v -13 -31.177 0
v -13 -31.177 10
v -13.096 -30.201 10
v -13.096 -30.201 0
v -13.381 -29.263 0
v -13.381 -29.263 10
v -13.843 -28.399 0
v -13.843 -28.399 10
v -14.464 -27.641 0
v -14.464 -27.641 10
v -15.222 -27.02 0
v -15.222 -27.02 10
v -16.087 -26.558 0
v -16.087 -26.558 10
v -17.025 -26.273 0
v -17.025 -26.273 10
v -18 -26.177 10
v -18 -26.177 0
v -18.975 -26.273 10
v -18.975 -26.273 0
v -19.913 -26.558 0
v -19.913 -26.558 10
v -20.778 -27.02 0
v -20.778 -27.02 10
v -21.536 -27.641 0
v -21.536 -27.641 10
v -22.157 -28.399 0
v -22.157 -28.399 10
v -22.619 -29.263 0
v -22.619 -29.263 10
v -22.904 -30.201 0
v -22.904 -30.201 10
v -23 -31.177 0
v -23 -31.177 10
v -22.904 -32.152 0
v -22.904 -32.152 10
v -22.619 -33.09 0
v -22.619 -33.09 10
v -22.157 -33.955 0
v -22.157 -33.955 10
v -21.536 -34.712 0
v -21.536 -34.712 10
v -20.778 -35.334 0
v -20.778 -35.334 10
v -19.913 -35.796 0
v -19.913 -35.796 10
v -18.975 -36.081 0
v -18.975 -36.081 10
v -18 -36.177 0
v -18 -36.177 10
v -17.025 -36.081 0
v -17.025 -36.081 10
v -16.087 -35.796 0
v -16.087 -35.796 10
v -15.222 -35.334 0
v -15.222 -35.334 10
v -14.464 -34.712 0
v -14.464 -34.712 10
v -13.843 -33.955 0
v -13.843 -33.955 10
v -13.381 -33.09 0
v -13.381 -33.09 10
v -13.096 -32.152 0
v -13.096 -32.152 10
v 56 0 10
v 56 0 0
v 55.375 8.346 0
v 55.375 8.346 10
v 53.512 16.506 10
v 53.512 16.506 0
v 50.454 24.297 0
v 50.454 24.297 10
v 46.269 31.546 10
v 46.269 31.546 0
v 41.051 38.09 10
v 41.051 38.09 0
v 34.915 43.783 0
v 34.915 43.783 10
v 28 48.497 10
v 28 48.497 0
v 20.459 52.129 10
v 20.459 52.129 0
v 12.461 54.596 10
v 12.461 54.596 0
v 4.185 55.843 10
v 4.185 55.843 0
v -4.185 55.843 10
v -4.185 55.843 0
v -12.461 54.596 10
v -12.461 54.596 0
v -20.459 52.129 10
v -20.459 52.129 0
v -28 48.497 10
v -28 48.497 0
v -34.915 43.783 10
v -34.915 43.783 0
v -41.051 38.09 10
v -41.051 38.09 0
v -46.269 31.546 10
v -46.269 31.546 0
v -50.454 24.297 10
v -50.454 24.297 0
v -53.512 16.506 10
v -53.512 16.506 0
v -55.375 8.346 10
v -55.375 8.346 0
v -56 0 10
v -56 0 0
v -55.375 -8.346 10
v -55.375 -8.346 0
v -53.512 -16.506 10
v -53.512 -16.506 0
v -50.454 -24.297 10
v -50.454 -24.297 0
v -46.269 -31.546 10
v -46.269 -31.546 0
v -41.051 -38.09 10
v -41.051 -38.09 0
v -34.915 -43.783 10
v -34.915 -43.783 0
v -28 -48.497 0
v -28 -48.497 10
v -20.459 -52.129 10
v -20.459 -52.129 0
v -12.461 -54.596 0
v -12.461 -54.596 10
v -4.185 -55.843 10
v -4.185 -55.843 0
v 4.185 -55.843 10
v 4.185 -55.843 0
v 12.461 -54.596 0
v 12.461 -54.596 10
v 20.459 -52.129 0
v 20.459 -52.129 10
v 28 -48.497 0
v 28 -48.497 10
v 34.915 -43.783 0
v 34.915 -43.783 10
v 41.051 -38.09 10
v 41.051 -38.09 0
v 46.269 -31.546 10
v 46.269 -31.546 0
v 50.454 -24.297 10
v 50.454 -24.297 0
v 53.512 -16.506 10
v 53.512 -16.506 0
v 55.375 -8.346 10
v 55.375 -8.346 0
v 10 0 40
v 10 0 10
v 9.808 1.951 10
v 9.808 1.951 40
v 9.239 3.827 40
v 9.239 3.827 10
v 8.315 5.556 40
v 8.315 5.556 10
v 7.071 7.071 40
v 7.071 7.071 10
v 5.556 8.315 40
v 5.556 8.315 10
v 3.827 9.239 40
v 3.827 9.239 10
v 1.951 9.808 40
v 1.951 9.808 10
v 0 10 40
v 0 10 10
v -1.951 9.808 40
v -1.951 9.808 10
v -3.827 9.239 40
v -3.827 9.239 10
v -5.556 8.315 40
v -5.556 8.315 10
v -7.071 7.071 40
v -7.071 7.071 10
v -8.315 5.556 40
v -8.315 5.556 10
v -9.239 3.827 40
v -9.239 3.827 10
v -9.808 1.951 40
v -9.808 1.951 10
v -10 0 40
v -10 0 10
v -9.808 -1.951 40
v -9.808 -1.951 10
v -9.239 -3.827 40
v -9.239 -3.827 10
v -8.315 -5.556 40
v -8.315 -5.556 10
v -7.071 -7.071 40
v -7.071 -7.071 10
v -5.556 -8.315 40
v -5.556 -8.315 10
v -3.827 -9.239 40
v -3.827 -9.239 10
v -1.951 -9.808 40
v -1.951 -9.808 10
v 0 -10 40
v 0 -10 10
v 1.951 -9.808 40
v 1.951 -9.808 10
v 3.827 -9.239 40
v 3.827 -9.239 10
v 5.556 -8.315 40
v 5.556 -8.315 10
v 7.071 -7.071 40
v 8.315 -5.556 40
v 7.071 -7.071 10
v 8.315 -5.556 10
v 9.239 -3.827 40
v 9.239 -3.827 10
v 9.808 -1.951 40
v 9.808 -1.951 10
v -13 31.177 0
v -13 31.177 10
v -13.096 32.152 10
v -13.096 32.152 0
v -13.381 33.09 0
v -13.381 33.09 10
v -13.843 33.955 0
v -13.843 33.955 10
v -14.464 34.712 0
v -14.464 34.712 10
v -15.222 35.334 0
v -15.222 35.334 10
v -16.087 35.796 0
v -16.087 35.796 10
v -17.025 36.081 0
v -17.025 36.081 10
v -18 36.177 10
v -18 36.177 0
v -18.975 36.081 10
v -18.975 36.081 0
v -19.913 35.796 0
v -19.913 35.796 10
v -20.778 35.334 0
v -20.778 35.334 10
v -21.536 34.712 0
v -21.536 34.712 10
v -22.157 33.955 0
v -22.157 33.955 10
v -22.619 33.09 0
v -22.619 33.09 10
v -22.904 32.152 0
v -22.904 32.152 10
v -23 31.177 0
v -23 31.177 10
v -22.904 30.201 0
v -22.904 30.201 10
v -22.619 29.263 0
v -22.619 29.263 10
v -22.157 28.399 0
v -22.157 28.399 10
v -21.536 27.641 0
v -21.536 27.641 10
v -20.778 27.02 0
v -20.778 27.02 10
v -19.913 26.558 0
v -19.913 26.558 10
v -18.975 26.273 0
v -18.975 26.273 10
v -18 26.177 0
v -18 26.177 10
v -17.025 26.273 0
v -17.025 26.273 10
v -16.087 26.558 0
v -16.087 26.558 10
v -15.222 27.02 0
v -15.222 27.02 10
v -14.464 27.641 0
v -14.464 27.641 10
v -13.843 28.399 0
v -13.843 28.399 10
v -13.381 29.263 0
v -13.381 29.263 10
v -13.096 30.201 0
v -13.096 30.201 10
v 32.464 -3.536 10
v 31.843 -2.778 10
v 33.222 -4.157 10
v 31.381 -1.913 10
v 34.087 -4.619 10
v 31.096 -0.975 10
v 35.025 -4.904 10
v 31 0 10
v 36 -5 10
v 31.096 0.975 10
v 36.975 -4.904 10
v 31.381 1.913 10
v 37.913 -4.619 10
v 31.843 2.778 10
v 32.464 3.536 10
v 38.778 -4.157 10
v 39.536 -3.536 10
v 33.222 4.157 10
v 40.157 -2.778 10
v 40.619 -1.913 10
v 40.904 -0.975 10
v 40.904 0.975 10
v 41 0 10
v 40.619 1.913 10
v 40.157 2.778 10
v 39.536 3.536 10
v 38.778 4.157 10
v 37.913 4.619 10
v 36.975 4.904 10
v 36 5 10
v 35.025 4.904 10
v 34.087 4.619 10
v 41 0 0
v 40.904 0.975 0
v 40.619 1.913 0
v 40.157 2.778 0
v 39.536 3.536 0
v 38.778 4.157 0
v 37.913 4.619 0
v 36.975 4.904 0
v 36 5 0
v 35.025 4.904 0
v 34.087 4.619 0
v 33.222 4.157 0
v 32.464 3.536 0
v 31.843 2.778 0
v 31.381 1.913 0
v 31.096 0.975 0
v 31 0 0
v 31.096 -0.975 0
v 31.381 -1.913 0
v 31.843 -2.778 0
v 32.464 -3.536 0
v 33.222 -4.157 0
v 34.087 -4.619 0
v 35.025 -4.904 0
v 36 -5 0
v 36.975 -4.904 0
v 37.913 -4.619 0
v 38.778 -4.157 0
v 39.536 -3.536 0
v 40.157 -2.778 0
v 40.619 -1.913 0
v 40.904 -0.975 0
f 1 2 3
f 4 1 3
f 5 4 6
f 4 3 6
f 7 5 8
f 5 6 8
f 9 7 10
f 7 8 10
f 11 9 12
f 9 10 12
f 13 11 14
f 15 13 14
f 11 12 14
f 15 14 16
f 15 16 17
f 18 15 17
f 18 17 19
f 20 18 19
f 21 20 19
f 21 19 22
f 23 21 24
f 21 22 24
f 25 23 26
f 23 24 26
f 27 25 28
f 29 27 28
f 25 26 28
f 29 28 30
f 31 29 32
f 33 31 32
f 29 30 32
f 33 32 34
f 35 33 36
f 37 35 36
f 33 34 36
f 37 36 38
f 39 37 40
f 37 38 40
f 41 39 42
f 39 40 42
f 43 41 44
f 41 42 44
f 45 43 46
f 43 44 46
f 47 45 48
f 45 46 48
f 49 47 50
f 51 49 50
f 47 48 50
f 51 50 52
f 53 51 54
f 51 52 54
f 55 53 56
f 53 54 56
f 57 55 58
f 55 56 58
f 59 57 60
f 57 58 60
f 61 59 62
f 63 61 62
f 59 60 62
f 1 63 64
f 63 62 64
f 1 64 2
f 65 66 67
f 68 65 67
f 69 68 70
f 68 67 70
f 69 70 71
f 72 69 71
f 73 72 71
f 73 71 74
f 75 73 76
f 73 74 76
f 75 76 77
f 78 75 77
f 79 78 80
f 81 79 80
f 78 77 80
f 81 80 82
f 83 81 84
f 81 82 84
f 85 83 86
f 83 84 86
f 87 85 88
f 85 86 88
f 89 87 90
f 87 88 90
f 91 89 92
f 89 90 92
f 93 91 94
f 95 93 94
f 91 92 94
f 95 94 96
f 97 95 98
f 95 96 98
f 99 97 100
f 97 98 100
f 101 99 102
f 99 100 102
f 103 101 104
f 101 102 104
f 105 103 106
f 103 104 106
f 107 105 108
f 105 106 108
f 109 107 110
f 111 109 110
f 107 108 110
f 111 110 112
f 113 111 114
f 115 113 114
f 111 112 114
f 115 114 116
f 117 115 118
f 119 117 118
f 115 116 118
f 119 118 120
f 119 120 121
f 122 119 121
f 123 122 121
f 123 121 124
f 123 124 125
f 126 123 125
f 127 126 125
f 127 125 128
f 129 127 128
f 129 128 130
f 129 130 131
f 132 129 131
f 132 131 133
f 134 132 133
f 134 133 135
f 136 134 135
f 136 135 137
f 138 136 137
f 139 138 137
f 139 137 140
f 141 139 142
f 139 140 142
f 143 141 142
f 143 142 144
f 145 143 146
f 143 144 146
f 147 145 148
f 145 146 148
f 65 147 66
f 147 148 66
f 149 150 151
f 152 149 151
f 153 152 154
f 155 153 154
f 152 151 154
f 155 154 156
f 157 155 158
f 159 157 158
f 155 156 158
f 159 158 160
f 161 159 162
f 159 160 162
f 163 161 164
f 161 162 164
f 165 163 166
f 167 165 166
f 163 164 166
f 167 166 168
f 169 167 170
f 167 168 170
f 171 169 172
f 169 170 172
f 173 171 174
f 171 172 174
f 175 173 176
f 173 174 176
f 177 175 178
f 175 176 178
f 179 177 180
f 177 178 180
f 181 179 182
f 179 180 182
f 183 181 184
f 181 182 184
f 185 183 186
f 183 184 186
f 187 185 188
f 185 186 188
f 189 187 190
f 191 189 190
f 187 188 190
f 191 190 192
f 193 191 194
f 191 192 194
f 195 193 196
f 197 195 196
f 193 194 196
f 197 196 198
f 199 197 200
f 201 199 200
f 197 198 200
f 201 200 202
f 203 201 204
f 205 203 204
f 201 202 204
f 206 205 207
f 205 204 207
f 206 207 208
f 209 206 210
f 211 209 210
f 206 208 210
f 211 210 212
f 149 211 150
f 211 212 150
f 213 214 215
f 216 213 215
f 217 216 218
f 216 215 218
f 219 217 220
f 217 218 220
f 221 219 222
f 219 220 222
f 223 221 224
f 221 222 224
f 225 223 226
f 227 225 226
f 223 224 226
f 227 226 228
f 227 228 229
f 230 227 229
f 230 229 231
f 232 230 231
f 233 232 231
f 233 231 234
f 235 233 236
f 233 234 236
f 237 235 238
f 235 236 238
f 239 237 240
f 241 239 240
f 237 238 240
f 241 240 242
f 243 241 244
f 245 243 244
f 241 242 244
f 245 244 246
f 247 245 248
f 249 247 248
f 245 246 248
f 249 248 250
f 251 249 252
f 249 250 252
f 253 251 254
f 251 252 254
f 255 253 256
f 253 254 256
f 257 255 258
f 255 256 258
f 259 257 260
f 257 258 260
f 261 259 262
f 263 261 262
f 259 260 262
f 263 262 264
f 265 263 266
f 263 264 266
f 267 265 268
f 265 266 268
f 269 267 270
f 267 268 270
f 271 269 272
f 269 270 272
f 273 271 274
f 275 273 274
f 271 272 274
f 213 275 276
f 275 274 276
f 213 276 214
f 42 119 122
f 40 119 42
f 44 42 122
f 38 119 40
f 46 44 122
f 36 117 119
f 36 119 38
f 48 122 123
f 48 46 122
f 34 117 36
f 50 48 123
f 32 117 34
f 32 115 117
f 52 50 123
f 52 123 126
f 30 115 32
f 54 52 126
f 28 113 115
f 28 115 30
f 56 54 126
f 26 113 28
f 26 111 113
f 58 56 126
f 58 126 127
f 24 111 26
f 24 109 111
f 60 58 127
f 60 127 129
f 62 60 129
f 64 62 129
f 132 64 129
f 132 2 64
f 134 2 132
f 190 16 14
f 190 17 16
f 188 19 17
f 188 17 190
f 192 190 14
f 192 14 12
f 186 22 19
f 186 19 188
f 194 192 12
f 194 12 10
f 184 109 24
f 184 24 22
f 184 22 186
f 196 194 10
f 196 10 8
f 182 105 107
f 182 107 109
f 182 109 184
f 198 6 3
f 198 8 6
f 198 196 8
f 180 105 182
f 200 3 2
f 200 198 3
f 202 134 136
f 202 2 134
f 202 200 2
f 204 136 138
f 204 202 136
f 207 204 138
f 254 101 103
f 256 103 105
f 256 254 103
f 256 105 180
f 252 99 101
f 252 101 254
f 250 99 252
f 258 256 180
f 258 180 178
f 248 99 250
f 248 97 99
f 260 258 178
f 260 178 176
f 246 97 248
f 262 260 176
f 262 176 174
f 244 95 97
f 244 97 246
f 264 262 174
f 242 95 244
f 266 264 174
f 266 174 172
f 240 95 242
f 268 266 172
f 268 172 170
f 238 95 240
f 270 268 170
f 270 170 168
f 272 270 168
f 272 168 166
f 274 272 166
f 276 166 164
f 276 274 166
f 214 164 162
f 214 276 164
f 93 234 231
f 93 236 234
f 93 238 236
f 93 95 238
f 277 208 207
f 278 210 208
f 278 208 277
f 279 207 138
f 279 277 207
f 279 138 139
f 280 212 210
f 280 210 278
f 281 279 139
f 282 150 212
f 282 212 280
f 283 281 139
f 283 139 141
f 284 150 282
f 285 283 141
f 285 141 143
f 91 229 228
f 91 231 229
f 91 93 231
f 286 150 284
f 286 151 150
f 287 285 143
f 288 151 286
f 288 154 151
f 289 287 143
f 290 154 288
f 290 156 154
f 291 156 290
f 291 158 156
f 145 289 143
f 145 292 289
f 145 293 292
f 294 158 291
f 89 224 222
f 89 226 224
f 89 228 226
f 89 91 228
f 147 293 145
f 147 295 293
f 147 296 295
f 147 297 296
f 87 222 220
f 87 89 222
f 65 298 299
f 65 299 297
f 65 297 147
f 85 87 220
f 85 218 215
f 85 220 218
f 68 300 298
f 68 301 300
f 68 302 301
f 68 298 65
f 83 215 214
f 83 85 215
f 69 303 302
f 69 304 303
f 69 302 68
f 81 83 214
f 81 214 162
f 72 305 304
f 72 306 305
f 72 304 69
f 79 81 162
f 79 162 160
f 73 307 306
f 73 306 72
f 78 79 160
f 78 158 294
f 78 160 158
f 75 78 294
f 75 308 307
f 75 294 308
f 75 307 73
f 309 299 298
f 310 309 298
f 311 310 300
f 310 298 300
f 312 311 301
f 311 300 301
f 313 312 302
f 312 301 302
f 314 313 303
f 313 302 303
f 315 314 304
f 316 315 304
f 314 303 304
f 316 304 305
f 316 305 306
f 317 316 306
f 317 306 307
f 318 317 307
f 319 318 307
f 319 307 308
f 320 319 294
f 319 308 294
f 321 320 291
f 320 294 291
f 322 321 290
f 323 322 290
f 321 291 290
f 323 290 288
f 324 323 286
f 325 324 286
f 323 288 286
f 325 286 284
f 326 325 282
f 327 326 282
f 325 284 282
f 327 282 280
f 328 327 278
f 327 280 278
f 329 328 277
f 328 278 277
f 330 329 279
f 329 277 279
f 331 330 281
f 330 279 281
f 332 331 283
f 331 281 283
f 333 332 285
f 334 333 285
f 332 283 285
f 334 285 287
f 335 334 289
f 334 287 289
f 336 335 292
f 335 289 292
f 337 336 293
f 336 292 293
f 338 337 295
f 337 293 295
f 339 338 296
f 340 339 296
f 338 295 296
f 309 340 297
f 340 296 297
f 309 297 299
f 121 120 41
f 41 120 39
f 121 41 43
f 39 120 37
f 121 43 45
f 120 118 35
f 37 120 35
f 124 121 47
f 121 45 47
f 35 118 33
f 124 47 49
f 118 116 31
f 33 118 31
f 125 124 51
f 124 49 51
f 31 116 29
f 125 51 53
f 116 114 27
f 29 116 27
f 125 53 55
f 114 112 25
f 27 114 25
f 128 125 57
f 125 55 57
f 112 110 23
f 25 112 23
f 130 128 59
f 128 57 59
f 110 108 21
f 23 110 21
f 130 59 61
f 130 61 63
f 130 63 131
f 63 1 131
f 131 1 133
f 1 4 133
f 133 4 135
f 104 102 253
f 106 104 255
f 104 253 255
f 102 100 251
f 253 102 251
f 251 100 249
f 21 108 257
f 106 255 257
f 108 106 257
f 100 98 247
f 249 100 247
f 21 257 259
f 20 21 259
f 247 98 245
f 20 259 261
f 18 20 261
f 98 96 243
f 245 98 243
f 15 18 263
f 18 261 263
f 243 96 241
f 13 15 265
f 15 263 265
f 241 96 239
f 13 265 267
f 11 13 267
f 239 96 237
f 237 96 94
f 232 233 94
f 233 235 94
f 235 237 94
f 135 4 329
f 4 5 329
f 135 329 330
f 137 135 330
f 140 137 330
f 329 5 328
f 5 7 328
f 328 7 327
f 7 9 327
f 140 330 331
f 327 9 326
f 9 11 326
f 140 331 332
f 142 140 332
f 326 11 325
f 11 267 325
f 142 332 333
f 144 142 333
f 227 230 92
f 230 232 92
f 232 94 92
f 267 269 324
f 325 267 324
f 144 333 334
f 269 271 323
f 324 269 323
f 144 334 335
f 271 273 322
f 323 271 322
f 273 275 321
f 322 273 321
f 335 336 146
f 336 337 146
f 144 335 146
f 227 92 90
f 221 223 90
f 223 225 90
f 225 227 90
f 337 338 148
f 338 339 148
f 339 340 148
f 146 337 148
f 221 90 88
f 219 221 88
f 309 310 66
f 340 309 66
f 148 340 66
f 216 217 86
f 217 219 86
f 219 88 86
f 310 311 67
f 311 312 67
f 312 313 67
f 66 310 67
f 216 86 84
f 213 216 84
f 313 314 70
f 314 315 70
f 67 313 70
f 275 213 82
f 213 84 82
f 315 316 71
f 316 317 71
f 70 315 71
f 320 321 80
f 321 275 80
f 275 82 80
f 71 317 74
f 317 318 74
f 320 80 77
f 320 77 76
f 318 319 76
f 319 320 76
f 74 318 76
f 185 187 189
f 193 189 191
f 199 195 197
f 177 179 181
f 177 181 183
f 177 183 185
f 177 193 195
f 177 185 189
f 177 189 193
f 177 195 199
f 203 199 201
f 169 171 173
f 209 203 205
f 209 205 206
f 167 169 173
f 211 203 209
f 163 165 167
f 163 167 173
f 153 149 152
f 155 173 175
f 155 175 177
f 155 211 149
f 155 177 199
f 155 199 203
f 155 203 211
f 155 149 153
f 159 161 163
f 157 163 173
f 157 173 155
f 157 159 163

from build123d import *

# Parameters (mm, degrees)
SKETCH1_R           = 56
BOSS_EXTRUDE1_DEPTH = 10
SKETCH2_R           = 10
BOSS_EXTRUDE2_DEPTH = 30
SKETCH3_R           = 5
CUT_EXTRUDE1_DEPTH  = 10


with BuildPart() as part:
    # Sketch1 → Boss-Extrude1 (new body)
    with BuildSketch(Plane.XY):
        Circle(SKETCH1_R)
    extrude(amount=BOSS_EXTRUDE1_DEPTH)

    # Sketch2 → Boss-Extrude2 (add)
    with BuildSketch(Plane.XY.offset(10)):
        Circle(SKETCH2_R)
    extrude(amount=BOSS_EXTRUDE2_DEPTH)

    # Sketch3 → Cut-Extrude1 (cut)
    with BuildSketch(Plane.XY.offset(10)):
        with Locations((36, 0)):
            Circle(SKETCH3_R)
        with Locations((-18, 31.176914536)):
            Circle(SKETCH3_R)
        with Locations((-18, -31.176914536)):
            Circle(SKETCH3_R)
    extrude(amount=-CUT_EXTRUDE1_DEPTH, mode=Mode.SUBTRACT)


solid = part.part
